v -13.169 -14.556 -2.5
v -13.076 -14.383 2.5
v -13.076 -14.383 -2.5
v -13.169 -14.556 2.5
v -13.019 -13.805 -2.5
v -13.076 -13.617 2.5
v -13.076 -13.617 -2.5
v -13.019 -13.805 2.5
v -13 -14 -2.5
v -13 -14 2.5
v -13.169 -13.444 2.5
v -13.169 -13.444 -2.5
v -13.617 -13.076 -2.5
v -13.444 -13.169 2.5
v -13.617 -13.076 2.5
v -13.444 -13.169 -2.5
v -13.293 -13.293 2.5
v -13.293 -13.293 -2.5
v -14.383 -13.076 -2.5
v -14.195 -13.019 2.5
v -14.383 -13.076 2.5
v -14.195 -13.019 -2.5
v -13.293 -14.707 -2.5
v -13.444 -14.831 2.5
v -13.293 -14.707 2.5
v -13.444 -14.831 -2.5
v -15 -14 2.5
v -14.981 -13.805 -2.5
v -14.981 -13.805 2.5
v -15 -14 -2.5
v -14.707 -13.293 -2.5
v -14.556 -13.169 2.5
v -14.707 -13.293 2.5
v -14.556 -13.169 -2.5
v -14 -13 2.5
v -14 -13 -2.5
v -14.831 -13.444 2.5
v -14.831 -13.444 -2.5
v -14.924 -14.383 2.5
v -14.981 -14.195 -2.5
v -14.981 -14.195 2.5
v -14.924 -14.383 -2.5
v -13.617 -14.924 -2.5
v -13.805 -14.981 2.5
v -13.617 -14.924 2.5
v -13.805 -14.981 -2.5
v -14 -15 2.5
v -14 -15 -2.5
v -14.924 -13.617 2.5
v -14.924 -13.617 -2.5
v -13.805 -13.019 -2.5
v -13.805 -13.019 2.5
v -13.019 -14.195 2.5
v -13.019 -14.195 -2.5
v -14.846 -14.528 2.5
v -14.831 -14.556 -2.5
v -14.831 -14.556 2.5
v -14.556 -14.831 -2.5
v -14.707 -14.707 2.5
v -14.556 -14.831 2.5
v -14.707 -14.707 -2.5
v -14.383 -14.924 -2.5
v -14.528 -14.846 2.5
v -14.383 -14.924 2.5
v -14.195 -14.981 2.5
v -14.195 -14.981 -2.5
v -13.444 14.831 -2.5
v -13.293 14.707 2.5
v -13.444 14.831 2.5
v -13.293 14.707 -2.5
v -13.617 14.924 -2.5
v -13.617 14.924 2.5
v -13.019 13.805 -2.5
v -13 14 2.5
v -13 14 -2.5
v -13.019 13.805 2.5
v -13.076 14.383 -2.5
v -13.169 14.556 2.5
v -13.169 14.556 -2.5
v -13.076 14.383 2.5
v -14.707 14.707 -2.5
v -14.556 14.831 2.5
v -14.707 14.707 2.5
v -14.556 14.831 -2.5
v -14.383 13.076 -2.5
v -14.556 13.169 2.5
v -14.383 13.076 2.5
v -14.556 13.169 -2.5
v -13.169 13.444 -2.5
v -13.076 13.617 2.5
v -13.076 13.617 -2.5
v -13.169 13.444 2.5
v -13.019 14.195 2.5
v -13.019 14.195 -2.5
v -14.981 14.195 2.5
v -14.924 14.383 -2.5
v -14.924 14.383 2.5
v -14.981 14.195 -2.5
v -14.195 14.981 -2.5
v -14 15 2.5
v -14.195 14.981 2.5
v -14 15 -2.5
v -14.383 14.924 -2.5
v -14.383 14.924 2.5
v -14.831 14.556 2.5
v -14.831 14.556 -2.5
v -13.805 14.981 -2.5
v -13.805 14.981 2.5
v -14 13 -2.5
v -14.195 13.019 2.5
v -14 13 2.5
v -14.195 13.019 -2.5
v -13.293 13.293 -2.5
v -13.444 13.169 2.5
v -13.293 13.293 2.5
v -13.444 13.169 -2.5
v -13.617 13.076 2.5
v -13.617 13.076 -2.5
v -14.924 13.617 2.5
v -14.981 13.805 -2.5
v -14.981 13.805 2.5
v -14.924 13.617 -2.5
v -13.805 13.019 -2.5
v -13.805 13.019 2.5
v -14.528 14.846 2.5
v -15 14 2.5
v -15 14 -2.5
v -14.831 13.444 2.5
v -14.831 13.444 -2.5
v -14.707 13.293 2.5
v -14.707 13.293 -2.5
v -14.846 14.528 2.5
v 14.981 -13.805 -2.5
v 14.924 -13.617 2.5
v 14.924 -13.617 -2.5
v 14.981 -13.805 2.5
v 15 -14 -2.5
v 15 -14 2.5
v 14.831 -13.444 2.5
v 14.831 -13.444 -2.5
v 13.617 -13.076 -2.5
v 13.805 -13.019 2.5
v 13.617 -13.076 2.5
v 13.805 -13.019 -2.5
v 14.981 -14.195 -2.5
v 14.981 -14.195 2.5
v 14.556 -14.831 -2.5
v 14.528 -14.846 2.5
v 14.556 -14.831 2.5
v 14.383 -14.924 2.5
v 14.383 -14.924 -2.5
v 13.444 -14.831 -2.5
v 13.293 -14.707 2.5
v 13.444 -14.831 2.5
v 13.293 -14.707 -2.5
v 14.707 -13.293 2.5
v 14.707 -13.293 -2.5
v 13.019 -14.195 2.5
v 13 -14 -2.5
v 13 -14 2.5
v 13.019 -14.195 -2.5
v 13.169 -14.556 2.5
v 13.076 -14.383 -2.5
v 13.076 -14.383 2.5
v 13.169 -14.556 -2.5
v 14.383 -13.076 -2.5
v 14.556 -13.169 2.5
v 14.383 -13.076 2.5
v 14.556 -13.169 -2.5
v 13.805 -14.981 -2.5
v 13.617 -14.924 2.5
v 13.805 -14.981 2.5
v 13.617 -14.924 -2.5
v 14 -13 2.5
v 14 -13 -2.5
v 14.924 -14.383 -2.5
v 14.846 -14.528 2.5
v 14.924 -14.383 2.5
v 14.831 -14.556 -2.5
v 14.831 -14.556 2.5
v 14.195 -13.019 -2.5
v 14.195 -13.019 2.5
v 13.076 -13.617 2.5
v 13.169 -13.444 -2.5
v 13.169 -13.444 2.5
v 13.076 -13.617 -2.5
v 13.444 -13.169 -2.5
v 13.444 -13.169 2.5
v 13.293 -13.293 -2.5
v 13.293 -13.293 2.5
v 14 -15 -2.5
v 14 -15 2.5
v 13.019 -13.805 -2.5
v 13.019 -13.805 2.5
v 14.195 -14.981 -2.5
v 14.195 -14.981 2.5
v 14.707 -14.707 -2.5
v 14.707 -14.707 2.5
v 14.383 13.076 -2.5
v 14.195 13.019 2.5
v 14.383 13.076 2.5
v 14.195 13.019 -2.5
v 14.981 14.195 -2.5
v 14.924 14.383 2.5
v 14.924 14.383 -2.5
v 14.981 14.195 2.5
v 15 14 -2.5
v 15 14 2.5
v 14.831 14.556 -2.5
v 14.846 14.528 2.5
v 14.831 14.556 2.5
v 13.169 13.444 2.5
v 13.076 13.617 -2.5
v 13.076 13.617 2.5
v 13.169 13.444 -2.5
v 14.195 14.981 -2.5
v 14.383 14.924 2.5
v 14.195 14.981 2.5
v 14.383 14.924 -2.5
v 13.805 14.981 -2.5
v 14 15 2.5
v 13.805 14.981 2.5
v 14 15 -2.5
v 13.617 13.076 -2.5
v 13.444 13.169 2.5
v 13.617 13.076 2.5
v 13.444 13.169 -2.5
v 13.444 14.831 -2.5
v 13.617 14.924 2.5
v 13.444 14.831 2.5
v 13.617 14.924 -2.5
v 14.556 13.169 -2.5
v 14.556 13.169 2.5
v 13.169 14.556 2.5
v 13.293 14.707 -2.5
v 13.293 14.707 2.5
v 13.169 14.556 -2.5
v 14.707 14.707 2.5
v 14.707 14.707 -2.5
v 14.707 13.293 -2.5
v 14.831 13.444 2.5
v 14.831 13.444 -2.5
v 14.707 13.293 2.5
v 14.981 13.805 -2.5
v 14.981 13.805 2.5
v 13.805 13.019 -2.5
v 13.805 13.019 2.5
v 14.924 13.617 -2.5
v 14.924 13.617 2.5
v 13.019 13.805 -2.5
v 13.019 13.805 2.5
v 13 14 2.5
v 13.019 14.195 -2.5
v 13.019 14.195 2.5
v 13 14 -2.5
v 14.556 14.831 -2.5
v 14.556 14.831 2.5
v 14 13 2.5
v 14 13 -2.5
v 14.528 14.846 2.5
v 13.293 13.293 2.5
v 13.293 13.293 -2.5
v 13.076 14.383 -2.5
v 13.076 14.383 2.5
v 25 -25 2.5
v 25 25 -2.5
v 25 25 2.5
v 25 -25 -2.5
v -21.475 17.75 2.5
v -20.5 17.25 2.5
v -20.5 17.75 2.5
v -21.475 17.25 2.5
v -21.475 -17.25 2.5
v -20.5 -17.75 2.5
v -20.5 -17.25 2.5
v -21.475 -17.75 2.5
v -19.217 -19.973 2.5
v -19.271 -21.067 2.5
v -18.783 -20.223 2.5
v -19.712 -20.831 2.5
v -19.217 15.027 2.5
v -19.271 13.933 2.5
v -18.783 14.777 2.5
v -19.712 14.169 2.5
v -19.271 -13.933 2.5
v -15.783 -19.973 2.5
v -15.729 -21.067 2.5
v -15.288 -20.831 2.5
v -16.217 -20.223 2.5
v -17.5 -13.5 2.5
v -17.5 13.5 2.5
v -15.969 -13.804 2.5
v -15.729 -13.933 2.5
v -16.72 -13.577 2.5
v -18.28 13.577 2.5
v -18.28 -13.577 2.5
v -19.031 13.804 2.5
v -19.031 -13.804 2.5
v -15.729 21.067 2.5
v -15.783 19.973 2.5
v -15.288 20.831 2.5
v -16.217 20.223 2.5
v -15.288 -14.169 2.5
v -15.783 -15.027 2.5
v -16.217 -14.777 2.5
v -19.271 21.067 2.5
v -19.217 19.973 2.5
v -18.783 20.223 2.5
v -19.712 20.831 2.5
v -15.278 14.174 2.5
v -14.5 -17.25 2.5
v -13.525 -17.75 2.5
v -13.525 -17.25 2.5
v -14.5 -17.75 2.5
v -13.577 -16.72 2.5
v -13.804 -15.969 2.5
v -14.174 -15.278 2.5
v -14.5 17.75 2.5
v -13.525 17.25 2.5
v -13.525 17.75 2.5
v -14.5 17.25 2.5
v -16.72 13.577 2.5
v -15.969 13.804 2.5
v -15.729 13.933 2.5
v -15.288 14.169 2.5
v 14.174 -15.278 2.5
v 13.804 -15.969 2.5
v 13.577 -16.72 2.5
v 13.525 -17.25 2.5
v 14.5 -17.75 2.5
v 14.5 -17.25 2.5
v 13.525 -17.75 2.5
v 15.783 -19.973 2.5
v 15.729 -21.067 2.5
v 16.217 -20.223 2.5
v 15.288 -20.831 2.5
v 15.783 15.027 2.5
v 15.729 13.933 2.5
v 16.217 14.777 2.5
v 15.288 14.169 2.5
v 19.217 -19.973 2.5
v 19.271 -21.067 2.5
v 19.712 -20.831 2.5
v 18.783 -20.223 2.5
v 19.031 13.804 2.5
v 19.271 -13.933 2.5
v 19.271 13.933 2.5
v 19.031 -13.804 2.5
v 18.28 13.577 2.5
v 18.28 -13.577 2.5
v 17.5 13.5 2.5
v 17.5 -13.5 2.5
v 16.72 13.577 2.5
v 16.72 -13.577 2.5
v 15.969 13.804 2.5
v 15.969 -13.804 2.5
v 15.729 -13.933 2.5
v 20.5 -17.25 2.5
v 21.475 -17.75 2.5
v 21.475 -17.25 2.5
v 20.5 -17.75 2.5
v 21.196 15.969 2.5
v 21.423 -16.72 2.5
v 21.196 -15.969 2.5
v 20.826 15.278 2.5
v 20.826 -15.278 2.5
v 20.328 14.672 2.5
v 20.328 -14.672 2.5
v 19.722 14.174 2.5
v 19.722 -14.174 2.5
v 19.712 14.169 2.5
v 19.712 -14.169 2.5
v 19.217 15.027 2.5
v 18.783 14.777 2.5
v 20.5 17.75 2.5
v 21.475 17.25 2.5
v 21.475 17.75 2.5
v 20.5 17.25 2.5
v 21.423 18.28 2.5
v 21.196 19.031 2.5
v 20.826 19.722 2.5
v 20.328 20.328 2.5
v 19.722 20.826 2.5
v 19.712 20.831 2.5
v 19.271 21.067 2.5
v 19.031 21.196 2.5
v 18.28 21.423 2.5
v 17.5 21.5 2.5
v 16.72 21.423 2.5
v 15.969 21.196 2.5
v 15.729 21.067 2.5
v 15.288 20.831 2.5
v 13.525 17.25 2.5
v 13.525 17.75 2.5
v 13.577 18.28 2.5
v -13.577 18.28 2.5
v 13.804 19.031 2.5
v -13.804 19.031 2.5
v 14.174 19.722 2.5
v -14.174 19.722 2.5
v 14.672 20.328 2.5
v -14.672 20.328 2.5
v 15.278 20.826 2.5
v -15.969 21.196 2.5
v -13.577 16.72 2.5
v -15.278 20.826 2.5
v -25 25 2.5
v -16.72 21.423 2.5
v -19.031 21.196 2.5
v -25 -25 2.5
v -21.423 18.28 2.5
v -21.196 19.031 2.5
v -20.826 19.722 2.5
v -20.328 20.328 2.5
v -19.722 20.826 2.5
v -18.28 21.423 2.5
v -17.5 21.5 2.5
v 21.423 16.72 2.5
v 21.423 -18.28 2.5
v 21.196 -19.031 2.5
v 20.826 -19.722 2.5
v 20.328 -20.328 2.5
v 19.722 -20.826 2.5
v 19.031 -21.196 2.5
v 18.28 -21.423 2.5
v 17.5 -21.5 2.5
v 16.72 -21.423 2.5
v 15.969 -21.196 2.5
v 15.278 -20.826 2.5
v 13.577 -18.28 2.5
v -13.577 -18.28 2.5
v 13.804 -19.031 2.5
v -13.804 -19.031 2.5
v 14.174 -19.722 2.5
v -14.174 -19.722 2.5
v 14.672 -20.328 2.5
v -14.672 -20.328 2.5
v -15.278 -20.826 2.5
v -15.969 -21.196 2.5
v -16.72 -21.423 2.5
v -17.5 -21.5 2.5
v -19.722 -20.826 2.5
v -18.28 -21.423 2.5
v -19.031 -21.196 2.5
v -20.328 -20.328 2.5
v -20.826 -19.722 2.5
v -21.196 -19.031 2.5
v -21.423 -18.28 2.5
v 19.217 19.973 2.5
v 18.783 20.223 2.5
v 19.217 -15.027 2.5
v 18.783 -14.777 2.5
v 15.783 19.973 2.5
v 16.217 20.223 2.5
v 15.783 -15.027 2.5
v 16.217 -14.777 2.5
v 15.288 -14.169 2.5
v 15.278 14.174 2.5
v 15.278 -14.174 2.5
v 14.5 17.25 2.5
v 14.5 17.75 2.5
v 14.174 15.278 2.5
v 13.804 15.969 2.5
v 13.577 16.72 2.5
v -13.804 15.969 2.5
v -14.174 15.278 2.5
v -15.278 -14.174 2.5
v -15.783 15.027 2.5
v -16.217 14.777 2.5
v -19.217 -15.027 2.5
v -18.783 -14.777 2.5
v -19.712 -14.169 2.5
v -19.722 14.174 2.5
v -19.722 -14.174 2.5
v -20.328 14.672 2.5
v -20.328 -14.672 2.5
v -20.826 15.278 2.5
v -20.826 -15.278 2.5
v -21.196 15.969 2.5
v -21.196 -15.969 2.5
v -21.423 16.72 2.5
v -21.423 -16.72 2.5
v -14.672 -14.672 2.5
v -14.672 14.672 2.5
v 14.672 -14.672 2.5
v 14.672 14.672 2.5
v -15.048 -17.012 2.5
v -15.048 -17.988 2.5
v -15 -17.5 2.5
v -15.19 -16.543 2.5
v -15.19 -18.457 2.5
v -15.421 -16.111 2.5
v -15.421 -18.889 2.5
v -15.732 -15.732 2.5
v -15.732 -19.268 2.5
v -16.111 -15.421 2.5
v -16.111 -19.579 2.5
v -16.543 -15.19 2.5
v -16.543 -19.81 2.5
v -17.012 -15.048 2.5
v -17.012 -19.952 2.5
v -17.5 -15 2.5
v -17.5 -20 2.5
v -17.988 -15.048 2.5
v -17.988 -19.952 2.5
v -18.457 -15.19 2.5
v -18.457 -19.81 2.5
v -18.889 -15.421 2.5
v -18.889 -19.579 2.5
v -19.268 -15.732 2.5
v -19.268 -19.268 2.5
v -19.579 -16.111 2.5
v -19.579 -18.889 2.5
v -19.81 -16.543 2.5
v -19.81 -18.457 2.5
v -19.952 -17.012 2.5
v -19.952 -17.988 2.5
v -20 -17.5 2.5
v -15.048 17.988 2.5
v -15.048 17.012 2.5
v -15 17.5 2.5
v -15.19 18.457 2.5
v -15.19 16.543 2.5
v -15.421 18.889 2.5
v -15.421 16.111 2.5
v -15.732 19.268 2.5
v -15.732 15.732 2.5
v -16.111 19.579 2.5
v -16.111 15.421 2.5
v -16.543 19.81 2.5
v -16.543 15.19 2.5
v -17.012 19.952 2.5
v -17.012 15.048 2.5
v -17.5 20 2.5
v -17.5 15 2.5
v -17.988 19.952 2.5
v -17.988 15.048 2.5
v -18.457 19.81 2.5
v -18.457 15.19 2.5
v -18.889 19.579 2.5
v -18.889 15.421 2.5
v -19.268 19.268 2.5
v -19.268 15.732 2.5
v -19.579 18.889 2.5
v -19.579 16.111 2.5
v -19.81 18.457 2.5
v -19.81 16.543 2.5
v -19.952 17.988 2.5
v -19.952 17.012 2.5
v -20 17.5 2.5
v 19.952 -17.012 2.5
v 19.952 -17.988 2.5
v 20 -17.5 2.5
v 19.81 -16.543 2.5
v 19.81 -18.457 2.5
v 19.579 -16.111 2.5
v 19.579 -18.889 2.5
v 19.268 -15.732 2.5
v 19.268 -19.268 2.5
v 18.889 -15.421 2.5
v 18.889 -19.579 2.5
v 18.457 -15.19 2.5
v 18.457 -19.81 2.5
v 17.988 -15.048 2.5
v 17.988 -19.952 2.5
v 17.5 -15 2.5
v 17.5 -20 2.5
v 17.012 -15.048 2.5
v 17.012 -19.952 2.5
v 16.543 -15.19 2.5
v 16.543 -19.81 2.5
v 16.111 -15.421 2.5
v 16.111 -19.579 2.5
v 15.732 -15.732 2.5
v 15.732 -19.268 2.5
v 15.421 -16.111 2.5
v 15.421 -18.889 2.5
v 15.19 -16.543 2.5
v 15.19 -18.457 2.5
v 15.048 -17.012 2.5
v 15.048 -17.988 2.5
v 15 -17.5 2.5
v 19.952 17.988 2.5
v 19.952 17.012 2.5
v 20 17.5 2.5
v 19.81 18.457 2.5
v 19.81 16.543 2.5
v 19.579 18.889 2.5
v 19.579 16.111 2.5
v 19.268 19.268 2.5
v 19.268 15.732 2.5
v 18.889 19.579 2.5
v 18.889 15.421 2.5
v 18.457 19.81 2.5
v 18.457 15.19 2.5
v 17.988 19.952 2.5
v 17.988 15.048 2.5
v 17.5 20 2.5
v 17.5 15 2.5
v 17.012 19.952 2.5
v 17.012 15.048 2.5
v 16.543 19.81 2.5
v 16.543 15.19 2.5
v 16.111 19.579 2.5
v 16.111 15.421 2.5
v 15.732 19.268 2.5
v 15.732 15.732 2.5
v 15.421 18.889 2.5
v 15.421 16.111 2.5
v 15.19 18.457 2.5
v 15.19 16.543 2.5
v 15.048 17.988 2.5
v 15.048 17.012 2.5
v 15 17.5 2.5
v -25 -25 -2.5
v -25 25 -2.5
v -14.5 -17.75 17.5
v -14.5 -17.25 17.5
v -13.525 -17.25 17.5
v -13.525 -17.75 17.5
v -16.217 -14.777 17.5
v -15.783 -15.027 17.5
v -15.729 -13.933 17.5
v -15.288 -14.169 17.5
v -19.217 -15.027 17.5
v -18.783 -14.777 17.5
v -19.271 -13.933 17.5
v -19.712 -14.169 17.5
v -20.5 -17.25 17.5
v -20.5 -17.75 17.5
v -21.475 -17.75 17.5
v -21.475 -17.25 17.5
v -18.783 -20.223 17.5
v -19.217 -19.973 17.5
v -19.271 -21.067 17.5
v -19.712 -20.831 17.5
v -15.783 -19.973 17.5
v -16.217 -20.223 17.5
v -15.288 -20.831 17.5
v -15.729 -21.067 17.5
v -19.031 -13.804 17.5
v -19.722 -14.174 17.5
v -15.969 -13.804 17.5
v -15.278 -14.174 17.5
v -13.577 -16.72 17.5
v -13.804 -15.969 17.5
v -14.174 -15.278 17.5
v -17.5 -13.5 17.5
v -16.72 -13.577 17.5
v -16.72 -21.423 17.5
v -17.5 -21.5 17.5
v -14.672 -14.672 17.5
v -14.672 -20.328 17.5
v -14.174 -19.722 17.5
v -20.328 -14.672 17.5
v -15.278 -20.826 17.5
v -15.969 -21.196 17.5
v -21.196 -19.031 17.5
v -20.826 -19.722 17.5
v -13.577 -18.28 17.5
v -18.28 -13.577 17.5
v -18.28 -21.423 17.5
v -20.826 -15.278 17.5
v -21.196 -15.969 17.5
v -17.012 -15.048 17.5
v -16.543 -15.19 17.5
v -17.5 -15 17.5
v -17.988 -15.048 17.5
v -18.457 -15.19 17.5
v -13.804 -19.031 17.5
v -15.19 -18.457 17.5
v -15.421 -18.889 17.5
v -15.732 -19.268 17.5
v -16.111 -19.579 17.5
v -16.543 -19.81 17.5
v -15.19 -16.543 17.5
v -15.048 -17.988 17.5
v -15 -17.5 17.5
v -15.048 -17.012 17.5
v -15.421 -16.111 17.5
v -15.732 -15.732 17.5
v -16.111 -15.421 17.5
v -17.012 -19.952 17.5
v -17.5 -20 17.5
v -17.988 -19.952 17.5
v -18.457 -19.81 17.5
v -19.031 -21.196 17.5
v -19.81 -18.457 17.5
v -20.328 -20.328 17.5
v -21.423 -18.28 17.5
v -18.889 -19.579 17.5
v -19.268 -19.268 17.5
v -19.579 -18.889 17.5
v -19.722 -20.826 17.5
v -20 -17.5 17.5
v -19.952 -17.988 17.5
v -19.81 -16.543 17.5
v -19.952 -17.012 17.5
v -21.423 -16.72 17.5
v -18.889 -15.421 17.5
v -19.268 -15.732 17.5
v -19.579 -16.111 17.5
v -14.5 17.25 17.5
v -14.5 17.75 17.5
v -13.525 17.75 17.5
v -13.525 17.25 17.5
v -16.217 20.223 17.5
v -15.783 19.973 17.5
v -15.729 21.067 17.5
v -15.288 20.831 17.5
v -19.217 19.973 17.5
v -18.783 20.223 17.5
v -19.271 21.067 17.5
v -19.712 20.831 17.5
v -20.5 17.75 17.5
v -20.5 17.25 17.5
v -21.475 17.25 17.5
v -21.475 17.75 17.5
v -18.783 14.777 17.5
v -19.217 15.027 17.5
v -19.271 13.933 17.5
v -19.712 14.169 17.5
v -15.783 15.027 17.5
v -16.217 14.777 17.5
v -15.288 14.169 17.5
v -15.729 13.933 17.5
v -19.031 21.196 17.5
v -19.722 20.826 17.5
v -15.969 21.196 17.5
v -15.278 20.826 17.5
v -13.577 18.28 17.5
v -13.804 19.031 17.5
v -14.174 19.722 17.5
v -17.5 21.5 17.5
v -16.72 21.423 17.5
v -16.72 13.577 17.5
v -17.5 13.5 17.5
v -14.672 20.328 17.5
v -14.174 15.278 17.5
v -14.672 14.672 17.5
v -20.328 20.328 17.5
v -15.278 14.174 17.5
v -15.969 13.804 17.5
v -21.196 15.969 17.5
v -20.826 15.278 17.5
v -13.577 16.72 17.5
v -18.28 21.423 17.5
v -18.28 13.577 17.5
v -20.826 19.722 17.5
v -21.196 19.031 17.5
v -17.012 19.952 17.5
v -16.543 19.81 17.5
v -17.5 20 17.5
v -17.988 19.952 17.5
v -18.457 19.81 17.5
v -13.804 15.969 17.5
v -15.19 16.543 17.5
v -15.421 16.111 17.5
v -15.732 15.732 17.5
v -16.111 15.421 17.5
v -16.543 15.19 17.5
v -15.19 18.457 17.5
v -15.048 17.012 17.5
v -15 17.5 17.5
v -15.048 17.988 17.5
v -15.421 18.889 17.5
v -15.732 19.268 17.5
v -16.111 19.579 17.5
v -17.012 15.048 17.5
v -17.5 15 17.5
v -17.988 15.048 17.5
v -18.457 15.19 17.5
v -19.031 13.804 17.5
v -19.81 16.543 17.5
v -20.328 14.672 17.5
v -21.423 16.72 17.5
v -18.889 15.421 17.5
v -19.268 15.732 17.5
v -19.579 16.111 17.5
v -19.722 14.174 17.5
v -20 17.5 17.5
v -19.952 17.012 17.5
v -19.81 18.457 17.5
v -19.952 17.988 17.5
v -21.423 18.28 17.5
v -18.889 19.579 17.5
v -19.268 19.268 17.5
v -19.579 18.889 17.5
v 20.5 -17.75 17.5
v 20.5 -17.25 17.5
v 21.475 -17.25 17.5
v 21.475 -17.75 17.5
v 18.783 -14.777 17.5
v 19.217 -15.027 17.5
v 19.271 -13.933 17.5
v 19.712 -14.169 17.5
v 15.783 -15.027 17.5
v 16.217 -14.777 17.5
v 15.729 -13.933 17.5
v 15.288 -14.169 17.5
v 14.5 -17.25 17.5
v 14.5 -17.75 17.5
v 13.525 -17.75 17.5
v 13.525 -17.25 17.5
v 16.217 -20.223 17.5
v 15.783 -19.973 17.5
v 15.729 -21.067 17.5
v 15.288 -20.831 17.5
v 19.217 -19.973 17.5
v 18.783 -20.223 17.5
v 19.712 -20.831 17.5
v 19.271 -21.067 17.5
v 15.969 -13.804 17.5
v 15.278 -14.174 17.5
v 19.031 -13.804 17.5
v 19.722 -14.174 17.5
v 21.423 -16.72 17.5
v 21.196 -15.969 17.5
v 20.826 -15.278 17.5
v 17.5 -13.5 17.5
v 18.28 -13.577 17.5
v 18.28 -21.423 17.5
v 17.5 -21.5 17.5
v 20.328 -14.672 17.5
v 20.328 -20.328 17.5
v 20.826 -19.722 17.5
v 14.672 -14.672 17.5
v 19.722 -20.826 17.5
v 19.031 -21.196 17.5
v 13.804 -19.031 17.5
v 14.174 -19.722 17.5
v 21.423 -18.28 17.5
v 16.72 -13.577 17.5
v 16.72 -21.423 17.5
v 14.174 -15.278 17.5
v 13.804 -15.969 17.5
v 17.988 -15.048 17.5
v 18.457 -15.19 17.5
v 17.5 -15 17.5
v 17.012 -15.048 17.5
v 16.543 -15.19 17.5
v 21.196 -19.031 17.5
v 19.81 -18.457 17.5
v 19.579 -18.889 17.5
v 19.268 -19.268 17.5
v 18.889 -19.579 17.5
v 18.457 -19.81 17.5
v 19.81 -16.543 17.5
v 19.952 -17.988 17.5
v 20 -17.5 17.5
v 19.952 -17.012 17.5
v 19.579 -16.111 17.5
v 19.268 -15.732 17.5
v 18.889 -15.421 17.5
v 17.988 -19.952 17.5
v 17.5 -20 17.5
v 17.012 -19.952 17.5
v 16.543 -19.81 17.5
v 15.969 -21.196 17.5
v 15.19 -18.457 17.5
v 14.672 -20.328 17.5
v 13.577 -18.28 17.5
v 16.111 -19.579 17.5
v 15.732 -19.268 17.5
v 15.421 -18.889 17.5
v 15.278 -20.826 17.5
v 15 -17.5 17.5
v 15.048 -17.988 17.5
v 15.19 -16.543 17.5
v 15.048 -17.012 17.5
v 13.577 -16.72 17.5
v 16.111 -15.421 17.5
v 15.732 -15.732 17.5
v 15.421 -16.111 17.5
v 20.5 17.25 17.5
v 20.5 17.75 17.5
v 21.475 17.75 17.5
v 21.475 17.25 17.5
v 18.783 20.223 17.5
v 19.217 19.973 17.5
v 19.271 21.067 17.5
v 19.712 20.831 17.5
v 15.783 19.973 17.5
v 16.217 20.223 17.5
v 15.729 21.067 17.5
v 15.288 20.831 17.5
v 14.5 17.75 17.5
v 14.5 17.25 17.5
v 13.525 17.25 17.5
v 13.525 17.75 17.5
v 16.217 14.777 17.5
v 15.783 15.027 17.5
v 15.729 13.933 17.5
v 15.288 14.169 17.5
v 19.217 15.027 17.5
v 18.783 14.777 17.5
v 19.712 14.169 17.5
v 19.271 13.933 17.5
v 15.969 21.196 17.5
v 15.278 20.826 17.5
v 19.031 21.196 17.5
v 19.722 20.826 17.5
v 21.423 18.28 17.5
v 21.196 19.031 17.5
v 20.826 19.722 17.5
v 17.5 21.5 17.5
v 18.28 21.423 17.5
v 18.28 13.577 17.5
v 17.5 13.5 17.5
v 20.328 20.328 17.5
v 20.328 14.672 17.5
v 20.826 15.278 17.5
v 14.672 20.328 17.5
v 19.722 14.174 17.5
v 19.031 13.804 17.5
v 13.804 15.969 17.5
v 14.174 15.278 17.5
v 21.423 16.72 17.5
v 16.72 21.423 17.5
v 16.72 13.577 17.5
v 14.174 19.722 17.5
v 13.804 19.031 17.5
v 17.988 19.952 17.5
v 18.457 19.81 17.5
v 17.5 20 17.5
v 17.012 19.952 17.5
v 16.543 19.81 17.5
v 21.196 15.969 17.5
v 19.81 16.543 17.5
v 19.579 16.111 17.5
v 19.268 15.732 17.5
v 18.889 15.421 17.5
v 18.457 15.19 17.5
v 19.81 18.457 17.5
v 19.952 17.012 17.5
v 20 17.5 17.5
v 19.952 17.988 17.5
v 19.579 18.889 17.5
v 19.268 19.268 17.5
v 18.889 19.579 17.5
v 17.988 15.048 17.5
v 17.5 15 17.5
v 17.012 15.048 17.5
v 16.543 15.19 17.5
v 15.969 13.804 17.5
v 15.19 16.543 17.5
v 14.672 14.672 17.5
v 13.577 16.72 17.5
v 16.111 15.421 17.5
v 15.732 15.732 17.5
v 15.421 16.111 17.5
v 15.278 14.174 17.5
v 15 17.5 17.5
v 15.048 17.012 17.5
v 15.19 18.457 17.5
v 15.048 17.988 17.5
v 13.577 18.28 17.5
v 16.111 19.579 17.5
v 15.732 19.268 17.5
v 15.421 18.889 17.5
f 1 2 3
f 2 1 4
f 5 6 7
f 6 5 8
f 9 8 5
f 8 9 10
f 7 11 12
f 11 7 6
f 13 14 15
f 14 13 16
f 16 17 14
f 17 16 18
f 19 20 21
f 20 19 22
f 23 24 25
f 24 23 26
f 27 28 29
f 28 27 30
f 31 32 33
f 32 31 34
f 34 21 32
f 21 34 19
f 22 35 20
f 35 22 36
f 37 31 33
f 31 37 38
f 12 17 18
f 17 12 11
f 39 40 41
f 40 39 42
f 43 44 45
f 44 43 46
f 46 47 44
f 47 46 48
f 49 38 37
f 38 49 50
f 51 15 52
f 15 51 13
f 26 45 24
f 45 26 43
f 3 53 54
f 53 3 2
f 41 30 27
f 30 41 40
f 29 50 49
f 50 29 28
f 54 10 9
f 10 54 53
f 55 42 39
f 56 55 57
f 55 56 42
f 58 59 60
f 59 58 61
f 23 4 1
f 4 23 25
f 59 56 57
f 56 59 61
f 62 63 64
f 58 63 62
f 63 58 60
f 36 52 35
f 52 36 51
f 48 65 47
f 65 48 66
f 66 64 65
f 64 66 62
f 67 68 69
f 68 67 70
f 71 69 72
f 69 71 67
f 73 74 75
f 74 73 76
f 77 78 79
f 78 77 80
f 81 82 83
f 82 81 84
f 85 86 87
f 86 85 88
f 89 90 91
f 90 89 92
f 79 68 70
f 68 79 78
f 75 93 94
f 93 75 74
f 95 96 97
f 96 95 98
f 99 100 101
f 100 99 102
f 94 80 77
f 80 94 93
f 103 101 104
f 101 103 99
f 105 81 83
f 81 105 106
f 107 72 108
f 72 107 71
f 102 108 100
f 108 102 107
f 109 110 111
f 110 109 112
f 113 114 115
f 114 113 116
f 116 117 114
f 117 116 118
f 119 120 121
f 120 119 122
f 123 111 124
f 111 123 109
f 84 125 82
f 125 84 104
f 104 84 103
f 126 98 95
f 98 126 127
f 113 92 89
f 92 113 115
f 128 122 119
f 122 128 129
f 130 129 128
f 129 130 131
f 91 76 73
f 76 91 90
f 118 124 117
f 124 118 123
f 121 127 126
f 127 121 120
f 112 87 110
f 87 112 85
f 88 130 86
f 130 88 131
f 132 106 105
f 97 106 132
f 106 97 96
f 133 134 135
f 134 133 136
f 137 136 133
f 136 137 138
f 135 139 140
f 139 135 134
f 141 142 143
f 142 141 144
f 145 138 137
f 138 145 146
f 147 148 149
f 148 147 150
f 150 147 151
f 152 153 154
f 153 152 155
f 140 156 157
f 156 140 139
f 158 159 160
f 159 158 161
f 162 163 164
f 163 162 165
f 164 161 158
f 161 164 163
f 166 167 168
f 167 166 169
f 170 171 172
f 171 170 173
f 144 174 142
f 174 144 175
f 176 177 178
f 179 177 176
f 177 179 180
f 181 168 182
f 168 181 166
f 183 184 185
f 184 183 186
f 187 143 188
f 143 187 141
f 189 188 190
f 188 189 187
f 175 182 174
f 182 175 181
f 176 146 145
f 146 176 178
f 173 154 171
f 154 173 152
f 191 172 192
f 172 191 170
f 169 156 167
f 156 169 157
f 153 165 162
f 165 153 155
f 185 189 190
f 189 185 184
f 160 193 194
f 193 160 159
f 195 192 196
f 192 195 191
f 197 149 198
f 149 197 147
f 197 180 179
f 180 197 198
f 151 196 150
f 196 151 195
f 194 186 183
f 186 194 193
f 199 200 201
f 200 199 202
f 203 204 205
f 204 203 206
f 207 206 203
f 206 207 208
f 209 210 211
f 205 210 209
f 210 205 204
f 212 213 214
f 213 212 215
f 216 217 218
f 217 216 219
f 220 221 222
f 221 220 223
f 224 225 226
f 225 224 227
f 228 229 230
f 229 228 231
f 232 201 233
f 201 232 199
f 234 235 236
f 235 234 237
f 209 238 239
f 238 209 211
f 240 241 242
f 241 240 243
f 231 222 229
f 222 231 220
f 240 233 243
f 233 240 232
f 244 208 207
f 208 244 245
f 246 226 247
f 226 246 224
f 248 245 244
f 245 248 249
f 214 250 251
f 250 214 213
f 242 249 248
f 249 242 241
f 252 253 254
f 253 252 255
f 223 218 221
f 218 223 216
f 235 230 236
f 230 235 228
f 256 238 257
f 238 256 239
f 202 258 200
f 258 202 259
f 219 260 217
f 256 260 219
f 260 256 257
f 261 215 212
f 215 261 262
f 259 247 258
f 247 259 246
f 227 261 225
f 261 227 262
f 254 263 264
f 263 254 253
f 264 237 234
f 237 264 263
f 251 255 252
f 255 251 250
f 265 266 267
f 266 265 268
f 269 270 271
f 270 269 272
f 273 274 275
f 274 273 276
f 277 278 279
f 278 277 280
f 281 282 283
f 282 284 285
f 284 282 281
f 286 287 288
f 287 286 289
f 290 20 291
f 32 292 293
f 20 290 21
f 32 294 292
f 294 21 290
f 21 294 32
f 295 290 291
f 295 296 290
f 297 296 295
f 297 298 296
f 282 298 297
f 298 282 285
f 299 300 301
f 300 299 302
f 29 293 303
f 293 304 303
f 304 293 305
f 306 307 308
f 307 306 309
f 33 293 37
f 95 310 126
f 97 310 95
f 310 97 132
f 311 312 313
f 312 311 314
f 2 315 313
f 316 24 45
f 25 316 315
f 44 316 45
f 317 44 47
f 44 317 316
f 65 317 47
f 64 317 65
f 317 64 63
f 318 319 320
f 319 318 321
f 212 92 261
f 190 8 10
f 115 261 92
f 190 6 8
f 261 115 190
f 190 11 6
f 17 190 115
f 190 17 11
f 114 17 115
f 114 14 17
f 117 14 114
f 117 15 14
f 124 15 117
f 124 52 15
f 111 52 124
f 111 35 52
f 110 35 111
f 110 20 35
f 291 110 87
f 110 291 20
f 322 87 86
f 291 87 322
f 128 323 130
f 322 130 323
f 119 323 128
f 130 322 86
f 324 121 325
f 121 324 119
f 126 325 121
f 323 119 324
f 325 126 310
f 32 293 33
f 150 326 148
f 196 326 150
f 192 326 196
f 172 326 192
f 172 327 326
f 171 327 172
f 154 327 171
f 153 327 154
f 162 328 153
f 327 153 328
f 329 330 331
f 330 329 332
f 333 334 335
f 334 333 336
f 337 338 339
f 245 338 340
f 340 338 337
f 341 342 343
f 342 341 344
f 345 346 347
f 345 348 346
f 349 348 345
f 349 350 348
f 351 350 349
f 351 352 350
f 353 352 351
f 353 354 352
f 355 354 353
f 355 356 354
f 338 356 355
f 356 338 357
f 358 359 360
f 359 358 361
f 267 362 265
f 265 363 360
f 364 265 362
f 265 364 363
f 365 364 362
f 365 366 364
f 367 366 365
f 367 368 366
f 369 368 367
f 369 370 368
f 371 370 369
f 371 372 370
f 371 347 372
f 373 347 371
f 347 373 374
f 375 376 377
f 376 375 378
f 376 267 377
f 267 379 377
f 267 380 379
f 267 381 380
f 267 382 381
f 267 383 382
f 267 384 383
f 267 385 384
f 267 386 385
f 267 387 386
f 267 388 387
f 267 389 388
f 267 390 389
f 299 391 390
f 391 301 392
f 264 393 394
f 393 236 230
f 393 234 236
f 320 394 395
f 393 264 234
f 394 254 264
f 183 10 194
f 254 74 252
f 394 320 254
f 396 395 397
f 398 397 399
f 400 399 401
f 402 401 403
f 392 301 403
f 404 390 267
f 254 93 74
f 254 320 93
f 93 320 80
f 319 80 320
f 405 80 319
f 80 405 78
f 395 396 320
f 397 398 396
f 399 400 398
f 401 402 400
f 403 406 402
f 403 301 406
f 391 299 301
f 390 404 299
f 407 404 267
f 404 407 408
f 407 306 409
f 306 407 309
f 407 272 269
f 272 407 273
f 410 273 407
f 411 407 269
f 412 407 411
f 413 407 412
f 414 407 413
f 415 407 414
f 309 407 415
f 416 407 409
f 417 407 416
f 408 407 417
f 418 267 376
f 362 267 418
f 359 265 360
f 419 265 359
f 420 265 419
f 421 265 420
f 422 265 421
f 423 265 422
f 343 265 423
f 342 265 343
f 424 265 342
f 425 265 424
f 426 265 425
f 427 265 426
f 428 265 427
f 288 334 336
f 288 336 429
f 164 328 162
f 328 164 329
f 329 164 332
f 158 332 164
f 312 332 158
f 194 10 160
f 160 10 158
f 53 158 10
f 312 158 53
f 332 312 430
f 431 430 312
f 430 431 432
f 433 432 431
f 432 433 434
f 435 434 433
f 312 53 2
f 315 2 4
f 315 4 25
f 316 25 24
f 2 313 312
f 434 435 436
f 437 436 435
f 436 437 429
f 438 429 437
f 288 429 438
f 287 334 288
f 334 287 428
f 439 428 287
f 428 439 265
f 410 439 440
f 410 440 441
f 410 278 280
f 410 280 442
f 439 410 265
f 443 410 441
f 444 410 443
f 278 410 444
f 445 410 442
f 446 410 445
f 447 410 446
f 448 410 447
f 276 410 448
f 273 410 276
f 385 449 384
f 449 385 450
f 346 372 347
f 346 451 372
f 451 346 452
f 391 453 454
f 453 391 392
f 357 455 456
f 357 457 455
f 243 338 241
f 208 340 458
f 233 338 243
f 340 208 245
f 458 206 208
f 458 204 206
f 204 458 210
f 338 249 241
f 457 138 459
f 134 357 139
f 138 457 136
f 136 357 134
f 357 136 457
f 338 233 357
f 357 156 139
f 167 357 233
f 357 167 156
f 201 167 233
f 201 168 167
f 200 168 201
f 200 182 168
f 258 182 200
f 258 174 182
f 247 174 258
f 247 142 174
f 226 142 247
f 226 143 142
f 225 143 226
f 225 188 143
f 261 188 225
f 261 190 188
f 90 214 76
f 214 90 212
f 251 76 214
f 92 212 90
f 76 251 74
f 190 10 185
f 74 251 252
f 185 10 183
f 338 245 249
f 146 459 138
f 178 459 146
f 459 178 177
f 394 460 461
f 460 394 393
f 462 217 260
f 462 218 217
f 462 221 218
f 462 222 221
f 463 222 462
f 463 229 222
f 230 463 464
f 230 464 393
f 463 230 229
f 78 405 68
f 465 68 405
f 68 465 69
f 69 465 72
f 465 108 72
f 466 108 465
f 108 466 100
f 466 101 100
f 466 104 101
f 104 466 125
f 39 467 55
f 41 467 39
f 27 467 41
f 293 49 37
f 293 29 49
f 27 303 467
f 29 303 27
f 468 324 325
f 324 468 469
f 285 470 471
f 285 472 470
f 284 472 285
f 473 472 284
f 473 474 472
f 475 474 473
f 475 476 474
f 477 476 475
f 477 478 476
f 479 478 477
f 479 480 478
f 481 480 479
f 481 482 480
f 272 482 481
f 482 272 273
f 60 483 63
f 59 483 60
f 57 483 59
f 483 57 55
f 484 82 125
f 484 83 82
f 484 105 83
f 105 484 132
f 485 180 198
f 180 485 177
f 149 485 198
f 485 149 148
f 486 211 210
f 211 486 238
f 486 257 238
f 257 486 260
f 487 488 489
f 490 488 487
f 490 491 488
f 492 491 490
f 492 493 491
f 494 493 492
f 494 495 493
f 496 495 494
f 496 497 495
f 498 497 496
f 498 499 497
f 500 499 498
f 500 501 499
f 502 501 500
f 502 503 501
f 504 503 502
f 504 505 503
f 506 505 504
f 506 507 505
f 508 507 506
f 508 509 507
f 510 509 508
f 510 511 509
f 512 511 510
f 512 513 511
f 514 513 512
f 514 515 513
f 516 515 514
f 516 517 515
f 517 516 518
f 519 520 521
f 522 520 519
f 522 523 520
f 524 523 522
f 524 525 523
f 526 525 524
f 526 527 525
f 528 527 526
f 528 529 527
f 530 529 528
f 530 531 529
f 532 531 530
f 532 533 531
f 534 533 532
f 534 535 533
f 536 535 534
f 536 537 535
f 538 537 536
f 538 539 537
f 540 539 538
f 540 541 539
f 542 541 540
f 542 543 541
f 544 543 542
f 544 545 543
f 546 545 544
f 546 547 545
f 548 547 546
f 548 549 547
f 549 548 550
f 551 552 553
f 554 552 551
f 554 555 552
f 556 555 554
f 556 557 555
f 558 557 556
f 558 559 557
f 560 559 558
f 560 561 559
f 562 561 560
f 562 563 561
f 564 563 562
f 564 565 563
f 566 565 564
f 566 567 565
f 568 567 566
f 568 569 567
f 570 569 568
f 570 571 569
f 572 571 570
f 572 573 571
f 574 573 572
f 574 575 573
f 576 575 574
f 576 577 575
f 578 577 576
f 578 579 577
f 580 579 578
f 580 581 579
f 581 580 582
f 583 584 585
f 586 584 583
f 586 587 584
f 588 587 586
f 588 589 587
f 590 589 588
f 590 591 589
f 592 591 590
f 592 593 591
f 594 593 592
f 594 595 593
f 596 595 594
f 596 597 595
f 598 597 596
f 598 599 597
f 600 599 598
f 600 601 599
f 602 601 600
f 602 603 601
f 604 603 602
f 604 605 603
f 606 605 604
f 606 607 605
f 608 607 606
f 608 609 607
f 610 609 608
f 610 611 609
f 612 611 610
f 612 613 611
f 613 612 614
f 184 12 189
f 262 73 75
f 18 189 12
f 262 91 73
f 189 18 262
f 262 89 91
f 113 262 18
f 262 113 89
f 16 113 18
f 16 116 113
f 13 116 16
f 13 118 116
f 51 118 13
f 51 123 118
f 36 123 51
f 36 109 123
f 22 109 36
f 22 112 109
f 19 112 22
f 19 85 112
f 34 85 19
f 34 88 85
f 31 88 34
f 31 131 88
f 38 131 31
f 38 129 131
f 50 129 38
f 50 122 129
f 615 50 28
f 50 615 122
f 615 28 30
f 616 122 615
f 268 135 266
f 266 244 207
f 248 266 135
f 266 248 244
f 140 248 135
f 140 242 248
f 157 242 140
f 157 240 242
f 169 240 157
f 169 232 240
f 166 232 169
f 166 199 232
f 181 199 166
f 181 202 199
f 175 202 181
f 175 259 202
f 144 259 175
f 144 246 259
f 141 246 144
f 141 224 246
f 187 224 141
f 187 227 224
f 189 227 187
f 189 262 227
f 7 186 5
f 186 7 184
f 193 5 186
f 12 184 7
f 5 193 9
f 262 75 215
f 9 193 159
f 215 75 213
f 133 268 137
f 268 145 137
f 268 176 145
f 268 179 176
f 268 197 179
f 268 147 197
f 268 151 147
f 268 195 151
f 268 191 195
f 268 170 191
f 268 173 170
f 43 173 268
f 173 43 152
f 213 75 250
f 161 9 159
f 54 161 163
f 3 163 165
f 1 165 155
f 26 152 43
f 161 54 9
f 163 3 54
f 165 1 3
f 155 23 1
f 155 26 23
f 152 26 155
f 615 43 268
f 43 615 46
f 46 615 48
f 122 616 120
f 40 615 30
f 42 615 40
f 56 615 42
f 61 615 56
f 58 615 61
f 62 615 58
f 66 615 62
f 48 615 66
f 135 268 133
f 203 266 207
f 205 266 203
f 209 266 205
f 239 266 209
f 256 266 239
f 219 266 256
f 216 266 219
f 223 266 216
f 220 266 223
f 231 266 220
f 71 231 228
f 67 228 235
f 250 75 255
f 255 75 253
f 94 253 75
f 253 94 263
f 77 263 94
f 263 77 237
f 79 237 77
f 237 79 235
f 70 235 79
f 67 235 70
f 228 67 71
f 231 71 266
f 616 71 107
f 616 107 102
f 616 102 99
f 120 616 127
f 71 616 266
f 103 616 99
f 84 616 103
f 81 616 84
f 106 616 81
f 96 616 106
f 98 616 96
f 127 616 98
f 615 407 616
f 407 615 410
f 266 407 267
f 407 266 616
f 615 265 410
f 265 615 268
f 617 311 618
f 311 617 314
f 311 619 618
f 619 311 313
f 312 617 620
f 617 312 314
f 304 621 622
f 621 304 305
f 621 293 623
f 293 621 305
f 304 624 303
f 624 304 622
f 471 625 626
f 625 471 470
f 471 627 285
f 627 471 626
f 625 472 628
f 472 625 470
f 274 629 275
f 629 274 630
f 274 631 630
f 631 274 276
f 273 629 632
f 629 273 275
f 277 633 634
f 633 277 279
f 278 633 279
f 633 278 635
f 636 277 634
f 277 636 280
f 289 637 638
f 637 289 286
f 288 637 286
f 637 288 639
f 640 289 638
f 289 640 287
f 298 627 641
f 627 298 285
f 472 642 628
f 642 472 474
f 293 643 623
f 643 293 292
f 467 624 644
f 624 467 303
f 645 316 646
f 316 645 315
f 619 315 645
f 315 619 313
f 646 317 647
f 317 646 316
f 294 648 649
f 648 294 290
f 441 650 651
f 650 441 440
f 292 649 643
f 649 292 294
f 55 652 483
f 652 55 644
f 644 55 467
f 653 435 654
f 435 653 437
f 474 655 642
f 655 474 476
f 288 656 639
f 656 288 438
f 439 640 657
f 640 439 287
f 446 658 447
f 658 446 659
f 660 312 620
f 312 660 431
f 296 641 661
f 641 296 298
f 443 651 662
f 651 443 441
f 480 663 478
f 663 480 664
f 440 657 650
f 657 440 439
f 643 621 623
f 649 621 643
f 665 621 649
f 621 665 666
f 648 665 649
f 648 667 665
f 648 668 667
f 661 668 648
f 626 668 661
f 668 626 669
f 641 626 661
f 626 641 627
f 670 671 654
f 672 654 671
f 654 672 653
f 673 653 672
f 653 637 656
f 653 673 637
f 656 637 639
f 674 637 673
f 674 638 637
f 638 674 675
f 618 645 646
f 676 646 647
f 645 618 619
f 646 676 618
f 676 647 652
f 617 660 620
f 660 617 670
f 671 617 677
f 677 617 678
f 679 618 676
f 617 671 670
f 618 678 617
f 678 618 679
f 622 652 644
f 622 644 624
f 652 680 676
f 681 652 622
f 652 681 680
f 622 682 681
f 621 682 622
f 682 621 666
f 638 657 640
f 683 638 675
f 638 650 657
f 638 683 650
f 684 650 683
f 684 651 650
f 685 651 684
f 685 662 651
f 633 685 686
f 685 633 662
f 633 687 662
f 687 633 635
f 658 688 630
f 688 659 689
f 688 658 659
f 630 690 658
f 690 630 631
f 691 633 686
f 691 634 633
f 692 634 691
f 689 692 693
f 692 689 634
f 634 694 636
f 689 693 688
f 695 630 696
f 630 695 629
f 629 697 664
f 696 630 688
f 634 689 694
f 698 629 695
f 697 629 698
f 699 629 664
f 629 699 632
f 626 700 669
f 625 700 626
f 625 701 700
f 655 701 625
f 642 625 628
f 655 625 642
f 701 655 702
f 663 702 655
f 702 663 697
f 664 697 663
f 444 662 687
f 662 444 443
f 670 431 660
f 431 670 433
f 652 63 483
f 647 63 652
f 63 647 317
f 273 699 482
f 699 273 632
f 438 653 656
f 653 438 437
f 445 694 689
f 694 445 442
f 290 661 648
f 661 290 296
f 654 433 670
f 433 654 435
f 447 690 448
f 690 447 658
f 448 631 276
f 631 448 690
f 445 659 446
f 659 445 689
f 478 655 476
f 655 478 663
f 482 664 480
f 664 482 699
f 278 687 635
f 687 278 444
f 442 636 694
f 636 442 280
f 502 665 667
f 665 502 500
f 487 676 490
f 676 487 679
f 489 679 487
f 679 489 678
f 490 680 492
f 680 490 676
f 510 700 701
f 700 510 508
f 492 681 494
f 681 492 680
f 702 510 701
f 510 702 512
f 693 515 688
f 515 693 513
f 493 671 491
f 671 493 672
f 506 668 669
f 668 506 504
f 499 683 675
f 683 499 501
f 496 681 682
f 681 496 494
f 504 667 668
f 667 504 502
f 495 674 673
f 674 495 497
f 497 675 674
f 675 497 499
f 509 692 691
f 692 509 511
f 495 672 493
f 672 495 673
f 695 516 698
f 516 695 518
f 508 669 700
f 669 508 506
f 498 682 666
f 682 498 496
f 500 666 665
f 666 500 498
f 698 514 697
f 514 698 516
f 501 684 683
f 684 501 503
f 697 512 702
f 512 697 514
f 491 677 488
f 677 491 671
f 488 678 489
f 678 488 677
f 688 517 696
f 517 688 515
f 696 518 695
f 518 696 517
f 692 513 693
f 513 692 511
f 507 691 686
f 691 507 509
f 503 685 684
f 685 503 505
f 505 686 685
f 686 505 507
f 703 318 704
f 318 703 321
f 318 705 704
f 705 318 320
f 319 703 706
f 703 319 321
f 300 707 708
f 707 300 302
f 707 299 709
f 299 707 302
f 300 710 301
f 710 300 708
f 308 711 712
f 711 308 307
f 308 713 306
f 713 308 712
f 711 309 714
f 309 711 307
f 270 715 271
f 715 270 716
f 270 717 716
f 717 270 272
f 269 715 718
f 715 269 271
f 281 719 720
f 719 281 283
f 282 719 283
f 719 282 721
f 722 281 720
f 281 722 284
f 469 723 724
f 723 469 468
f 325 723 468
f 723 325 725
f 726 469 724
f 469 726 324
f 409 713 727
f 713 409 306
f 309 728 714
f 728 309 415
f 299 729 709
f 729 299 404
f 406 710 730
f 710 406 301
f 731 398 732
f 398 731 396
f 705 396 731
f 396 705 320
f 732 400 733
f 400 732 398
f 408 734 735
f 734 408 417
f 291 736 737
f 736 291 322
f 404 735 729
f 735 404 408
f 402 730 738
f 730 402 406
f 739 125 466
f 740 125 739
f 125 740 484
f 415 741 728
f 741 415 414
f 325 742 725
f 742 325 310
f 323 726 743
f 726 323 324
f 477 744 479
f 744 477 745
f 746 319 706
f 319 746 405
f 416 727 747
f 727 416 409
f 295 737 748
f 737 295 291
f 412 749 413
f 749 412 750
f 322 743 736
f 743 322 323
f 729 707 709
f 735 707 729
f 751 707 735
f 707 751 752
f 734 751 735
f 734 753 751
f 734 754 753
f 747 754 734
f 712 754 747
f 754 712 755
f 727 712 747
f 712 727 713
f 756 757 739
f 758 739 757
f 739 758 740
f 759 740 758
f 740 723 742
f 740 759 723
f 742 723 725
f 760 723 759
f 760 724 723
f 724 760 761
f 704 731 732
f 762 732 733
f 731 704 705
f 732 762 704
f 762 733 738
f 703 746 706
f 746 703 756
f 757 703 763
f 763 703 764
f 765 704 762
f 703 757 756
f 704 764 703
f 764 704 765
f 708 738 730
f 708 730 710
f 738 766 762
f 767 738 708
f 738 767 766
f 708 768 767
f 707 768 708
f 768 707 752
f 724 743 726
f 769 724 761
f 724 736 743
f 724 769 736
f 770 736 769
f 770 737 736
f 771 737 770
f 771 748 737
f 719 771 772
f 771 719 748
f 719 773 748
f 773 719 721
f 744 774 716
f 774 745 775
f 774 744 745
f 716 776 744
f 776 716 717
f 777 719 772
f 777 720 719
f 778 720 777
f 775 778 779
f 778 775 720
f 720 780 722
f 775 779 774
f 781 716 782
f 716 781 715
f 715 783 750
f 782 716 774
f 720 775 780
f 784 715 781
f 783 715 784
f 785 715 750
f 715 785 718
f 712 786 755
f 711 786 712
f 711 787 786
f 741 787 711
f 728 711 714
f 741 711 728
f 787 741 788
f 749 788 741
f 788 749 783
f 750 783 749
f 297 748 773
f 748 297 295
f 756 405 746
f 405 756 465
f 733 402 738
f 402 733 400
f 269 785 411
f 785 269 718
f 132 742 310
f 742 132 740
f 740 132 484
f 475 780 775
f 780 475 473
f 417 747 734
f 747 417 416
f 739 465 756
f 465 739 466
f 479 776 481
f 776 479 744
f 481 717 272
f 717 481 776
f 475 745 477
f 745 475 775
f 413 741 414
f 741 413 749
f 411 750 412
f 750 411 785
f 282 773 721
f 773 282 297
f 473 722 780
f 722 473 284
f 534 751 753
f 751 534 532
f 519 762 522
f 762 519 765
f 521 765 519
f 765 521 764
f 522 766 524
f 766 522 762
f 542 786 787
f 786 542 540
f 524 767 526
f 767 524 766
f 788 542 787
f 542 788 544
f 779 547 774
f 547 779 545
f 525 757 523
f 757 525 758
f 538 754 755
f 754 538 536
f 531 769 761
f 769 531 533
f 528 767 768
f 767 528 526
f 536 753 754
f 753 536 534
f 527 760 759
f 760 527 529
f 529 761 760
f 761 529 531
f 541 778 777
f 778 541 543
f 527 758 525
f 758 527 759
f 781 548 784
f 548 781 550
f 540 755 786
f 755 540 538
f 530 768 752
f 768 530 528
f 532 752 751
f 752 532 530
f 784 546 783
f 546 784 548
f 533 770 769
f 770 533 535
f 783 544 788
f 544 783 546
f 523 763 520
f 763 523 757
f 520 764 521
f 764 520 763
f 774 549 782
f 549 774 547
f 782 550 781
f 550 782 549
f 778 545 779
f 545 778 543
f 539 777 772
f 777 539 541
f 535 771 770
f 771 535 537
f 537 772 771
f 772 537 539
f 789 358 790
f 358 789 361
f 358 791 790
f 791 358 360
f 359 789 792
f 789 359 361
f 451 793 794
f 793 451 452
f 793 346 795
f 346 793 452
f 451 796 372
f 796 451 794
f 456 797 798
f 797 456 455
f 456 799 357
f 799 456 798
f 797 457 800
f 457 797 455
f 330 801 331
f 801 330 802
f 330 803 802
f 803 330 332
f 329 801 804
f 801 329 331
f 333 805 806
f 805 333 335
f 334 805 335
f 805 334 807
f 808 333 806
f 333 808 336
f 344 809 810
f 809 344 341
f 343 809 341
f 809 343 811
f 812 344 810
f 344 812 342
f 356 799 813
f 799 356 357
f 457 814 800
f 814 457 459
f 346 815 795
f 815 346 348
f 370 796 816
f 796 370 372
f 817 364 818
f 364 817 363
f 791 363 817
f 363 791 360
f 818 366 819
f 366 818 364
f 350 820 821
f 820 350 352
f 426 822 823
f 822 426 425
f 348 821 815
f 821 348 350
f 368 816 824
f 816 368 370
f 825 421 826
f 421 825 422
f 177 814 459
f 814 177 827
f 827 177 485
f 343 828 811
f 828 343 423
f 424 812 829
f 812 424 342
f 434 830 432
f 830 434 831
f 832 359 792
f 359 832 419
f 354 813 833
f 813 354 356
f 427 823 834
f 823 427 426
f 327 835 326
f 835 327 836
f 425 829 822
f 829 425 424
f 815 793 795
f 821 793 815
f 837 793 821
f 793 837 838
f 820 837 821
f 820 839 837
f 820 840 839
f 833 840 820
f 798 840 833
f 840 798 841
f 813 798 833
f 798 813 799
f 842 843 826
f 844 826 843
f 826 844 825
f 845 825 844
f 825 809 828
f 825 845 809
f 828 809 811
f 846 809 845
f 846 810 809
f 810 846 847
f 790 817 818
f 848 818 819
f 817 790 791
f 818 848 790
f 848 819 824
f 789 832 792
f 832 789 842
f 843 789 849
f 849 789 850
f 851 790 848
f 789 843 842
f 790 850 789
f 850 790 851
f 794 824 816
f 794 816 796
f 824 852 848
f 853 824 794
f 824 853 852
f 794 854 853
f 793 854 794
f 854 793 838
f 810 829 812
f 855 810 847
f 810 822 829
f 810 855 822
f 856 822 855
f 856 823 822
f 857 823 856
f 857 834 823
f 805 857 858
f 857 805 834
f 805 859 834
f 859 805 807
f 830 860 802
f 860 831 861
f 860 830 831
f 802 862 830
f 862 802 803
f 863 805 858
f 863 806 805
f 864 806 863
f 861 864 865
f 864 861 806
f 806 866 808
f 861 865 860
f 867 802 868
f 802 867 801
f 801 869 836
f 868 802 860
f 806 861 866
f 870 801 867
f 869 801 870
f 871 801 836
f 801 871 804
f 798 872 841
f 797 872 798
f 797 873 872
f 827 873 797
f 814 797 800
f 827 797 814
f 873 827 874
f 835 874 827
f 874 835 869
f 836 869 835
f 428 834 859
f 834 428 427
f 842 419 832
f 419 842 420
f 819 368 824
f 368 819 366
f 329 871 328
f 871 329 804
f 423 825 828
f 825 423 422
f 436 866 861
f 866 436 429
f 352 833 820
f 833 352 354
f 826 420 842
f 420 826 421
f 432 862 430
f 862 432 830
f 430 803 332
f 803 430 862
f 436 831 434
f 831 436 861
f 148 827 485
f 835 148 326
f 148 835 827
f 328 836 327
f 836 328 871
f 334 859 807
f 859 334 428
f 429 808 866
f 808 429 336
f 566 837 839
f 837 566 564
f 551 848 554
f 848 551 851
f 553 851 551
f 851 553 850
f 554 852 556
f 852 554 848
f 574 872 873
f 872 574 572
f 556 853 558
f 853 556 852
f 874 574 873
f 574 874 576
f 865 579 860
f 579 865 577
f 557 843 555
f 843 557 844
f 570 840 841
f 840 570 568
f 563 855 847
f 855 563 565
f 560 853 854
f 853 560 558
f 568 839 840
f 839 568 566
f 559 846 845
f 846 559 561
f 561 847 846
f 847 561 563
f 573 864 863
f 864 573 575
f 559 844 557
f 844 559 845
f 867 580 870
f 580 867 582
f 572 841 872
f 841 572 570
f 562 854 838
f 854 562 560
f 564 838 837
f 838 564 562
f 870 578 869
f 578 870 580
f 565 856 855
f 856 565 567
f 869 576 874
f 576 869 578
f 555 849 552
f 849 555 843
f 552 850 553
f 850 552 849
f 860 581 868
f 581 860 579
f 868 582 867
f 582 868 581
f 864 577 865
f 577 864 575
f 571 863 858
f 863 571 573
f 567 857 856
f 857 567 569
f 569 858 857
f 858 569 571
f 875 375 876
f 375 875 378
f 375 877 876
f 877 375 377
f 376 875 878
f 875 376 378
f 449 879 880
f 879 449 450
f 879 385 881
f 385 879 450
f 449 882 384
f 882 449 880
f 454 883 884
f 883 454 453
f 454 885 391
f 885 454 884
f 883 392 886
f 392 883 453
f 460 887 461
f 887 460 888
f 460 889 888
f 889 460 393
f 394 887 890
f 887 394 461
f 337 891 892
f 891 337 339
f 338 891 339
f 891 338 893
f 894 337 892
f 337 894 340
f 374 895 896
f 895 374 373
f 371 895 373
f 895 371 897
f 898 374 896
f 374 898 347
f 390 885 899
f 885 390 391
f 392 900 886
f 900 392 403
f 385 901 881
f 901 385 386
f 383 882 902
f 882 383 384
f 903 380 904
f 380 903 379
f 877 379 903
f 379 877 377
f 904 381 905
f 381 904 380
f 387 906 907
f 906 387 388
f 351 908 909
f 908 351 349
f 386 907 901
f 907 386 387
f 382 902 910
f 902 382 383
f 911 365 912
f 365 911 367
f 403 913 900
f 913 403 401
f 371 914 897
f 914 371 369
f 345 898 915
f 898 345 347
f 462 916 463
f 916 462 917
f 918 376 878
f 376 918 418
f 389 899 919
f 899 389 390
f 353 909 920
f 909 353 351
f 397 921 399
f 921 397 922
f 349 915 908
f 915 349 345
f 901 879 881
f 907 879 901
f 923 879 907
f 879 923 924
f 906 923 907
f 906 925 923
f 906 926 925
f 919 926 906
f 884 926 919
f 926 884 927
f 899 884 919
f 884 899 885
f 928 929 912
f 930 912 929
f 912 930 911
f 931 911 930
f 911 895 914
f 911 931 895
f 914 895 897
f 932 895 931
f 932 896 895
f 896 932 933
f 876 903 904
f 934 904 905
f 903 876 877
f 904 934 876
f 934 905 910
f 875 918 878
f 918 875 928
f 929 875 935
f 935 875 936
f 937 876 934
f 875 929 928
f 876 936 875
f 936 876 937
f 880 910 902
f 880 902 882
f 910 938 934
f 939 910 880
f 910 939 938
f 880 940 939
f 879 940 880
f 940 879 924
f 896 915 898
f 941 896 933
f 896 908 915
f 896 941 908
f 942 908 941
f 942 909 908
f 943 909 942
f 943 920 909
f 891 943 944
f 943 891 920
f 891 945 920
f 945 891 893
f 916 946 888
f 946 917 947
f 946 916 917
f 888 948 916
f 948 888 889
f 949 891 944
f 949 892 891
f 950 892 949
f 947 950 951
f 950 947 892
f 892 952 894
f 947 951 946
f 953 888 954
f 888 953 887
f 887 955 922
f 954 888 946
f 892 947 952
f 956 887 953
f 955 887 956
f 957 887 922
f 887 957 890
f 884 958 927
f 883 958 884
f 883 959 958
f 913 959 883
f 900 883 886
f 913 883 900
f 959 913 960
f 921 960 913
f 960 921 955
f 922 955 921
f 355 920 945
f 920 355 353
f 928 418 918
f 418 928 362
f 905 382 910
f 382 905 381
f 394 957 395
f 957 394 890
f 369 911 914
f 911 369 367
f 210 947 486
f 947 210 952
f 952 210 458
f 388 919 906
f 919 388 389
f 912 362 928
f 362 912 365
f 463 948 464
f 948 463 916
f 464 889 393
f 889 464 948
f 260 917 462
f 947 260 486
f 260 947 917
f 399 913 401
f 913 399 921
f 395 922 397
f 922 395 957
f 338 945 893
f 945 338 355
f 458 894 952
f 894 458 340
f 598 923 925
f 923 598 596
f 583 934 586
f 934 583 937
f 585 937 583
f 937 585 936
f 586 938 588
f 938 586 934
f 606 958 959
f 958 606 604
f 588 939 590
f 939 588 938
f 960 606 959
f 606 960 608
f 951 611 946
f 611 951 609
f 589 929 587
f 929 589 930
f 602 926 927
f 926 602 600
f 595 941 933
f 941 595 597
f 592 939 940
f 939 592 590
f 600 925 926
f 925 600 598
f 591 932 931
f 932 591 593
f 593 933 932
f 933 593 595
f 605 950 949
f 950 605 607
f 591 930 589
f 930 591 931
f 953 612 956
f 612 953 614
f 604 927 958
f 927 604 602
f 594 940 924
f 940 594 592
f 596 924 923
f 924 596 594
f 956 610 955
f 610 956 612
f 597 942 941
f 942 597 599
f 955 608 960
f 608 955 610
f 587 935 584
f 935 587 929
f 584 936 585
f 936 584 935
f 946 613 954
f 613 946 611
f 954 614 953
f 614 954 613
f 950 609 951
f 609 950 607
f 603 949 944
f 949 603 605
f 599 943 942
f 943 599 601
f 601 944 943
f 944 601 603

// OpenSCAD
// Module Design Pattern Template
// Demonstrates best practices for organizing code with reusable modules
// Modules promote code reuse, clarity, and maintainability

// ============================================
// CONFIGURATION SECTION
// ============================================

$fn = 32;

// Component dimensions
connectordiameter = 8;
connectorlength = 15;
connectorwall = 1.5;

basesize = 50;
baseheight = 5;

// ============================================
// UTILITY MODULES (General Purpose)
// ============================================

// Create a hollow cylinder (tube/connector)
module hollowcylinder(od, id, height) {
    difference() {
        cylinder(h = height, d = od, center = true);
        cylinder(h = height + 1, d = id, center = true);
    }
}

// Create a flat base/mounting plate
module flatbase(size, thickness) {
    cube([size, size, thickness], center = true);
}

// Create corner supports for strengthening
module cornersupport(size, height) {
    linearextrude(height = height, center = true)
        polygon(points = [[0, 0], [size, 0], [0, size]]);
}

// ============================================
// SPECIFIC COMPONENT MODULES
// ============================================

// Connector with internal thread pattern (for joining parts)
module connectorwiththreads(od, id, length, threads) {
    difference() {
        // Main connector body
        cylinder(h = length, d = od, center = true);
        
        // Hollow core
        cylinder(h = length + 1, d = id, center = true);
        
        // Thread pattern (decorative/functional grooves)
        for (i = [0 : threads - 1]) {
            rotate([0, 0, (360 / threads) * i])
                translate([od/2 - 0.5, 0, 0])
                    cube([1, 0.5, length + 1], center = true);
        }
    }
}

// Joint/coupling to connect two parts
module couplingjoint(connectorod, connectorid, couplelength) {
    cylinder(h = couplelength, d = connectorod, center = true);
}

// Base with mounting holes
module basewithholes(size, thickness, holediameter, holespacing) {
    difference() {
        // Solid base
        flatbase(size, thickness);
        
        // Subtract mounting holes
        for (x = [-holespacing/2, holespacing/2]) {
            for (y = [-holespacing/2, holespacing/2]) {
                translate([x, y, 0])
                    cylinder(h = thickness + 1, d = holediameter, center = true);
            }
        }
    }
}

// ============================================
// ASSEMBLY MODULES (Combine Components)
// ============================================

// Basic assembly: base + connector
module simpleconnectorassembly(basesz, baseh, connod, connid, connlen) {
    // Base plate
    flatbase(basesz, baseh);
    
    // Connector mounted vertically
    translate([0, 0, baseh/2 + connlen/2])
        hollowcylinder(connod, connid, connlen);
}

// Complex assembly with multiple connectors
module multiconnectorassembly(basesz, baseh, spacing) {
    // Central base
    basewithholes(basesz, baseh, 2, spacing * 0.8);
    
    // Mounted connectors at four corners
    for (x = [-spacing/2, spacing/2]) {
        for (y = [-spacing/2, spacing/2]) {
            translate([x, y, baseh/2 + connectorlength/2])
                connectorwiththreads(connectordiameter, 
                                      connectordiameter - 2*connectorwall, 
                                      connectorlength, 
                                      6);
        }
    }
}

// ============================================
// OUTPUT SECTION
// ============================================

// Choose which assembly to render:

// Option 1: Simple assembly
// simpleconnectorassembly(basesize, baseheight, 
//                          connectordiameter, 
//                          connectordiameter - 2*connectorwall, 
//                          connectorlength);

// Option 2: Multi-connector assembly
multiconnectorassembly(basesize, baseheight, basesize * 0.7);

// ============================================
// MODULE DESIGN BEST PRACTICES
// ============================================
// 1. Utility Modules: General-purpose shapes
//    - Reusable across many projects
//    - Keep parameters generic
//
// 2. Component Modules: Specific parts
//    - Build on utility modules
//    - Include feature-specific logic
//
// 3. Assembly Modules: Combine components
//    - Use positioning and transforms
//    - Organize parts spatially
//
// 4. Naming Conventions:
//    - Use descriptive names (hollowcylinder, not hc)
//    - Prefix related modules (base*, connector*)
//
// 5. Parameter Guidelines:
//    - Put adjustable values at top
//    - Use meaningful default values
//    - Document parameter purposes
//
// 6. Code Organization:
//    - Group related modules
//    - Start with utilities, end with assemblies
//    - Use comments to separate sections
